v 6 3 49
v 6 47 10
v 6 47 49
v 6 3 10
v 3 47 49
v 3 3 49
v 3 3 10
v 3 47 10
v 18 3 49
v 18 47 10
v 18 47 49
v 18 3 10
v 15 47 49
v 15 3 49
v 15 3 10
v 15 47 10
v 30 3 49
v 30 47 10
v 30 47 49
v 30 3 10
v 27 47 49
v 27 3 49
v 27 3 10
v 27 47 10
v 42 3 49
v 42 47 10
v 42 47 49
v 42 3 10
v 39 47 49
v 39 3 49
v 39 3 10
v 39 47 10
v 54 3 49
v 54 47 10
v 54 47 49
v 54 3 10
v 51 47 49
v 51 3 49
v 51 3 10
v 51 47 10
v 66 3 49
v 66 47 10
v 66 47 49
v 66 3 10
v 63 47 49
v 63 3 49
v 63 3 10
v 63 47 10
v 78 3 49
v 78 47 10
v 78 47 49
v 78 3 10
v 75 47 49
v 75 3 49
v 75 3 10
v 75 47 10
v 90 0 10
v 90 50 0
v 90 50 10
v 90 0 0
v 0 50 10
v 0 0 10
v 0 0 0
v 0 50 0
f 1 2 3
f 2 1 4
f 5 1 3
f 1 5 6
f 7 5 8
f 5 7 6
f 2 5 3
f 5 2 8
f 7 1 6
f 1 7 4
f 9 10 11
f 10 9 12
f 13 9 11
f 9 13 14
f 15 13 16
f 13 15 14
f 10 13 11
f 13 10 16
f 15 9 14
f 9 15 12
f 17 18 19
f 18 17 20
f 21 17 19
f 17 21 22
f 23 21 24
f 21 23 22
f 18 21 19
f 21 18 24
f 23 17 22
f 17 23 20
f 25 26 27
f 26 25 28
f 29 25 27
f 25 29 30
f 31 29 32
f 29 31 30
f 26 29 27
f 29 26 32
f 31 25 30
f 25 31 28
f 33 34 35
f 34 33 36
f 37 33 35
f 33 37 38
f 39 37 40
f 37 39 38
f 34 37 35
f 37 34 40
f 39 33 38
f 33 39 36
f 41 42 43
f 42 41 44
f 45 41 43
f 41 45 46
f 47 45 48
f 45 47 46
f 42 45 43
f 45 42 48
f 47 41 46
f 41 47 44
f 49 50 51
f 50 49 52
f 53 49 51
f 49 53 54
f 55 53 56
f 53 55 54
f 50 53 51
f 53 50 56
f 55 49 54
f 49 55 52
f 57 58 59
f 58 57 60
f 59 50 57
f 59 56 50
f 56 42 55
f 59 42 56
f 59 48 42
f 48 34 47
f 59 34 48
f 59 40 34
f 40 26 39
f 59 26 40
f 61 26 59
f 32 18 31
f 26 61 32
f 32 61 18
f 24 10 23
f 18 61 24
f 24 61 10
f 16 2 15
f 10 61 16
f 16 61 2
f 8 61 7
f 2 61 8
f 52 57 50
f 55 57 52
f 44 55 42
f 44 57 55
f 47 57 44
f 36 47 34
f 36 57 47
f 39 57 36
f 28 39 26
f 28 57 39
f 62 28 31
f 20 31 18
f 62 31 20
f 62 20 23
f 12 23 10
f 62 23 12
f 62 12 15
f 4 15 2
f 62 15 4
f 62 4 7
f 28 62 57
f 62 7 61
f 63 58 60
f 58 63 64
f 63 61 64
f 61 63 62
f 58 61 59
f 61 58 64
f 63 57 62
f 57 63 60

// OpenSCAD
$fn = 32;

// ----------------------------------------------------------------------
// Heatsink: uniform fin block
// ----------------------------------------------------------------------

// --- parameters (mm) ---
base_l = 90;              // base length, X
base_w = 50;              // base width, Y
base_t = 10;              // base plate thickness
fin_h = 40;               // fin height above the base
fin_t = 3;                // fin thickness
edge = 3;                 // margin from the base ends
pitch = 12;               // fin pitch

n_fins = floor((base_l - 2 * edge - fin_t) / pitch) + 1;  // fin count
total_h = base_t + fin_h - 1;  // overall height

union() {
  cube([base_l, base_w, base_t]);
  for (i = [0 : n_fins - 1])
    translate([edge + i * pitch, edge, base_t - 1])
      cube([fin_t, base_w - 2 * edge, fin_h]);
}
